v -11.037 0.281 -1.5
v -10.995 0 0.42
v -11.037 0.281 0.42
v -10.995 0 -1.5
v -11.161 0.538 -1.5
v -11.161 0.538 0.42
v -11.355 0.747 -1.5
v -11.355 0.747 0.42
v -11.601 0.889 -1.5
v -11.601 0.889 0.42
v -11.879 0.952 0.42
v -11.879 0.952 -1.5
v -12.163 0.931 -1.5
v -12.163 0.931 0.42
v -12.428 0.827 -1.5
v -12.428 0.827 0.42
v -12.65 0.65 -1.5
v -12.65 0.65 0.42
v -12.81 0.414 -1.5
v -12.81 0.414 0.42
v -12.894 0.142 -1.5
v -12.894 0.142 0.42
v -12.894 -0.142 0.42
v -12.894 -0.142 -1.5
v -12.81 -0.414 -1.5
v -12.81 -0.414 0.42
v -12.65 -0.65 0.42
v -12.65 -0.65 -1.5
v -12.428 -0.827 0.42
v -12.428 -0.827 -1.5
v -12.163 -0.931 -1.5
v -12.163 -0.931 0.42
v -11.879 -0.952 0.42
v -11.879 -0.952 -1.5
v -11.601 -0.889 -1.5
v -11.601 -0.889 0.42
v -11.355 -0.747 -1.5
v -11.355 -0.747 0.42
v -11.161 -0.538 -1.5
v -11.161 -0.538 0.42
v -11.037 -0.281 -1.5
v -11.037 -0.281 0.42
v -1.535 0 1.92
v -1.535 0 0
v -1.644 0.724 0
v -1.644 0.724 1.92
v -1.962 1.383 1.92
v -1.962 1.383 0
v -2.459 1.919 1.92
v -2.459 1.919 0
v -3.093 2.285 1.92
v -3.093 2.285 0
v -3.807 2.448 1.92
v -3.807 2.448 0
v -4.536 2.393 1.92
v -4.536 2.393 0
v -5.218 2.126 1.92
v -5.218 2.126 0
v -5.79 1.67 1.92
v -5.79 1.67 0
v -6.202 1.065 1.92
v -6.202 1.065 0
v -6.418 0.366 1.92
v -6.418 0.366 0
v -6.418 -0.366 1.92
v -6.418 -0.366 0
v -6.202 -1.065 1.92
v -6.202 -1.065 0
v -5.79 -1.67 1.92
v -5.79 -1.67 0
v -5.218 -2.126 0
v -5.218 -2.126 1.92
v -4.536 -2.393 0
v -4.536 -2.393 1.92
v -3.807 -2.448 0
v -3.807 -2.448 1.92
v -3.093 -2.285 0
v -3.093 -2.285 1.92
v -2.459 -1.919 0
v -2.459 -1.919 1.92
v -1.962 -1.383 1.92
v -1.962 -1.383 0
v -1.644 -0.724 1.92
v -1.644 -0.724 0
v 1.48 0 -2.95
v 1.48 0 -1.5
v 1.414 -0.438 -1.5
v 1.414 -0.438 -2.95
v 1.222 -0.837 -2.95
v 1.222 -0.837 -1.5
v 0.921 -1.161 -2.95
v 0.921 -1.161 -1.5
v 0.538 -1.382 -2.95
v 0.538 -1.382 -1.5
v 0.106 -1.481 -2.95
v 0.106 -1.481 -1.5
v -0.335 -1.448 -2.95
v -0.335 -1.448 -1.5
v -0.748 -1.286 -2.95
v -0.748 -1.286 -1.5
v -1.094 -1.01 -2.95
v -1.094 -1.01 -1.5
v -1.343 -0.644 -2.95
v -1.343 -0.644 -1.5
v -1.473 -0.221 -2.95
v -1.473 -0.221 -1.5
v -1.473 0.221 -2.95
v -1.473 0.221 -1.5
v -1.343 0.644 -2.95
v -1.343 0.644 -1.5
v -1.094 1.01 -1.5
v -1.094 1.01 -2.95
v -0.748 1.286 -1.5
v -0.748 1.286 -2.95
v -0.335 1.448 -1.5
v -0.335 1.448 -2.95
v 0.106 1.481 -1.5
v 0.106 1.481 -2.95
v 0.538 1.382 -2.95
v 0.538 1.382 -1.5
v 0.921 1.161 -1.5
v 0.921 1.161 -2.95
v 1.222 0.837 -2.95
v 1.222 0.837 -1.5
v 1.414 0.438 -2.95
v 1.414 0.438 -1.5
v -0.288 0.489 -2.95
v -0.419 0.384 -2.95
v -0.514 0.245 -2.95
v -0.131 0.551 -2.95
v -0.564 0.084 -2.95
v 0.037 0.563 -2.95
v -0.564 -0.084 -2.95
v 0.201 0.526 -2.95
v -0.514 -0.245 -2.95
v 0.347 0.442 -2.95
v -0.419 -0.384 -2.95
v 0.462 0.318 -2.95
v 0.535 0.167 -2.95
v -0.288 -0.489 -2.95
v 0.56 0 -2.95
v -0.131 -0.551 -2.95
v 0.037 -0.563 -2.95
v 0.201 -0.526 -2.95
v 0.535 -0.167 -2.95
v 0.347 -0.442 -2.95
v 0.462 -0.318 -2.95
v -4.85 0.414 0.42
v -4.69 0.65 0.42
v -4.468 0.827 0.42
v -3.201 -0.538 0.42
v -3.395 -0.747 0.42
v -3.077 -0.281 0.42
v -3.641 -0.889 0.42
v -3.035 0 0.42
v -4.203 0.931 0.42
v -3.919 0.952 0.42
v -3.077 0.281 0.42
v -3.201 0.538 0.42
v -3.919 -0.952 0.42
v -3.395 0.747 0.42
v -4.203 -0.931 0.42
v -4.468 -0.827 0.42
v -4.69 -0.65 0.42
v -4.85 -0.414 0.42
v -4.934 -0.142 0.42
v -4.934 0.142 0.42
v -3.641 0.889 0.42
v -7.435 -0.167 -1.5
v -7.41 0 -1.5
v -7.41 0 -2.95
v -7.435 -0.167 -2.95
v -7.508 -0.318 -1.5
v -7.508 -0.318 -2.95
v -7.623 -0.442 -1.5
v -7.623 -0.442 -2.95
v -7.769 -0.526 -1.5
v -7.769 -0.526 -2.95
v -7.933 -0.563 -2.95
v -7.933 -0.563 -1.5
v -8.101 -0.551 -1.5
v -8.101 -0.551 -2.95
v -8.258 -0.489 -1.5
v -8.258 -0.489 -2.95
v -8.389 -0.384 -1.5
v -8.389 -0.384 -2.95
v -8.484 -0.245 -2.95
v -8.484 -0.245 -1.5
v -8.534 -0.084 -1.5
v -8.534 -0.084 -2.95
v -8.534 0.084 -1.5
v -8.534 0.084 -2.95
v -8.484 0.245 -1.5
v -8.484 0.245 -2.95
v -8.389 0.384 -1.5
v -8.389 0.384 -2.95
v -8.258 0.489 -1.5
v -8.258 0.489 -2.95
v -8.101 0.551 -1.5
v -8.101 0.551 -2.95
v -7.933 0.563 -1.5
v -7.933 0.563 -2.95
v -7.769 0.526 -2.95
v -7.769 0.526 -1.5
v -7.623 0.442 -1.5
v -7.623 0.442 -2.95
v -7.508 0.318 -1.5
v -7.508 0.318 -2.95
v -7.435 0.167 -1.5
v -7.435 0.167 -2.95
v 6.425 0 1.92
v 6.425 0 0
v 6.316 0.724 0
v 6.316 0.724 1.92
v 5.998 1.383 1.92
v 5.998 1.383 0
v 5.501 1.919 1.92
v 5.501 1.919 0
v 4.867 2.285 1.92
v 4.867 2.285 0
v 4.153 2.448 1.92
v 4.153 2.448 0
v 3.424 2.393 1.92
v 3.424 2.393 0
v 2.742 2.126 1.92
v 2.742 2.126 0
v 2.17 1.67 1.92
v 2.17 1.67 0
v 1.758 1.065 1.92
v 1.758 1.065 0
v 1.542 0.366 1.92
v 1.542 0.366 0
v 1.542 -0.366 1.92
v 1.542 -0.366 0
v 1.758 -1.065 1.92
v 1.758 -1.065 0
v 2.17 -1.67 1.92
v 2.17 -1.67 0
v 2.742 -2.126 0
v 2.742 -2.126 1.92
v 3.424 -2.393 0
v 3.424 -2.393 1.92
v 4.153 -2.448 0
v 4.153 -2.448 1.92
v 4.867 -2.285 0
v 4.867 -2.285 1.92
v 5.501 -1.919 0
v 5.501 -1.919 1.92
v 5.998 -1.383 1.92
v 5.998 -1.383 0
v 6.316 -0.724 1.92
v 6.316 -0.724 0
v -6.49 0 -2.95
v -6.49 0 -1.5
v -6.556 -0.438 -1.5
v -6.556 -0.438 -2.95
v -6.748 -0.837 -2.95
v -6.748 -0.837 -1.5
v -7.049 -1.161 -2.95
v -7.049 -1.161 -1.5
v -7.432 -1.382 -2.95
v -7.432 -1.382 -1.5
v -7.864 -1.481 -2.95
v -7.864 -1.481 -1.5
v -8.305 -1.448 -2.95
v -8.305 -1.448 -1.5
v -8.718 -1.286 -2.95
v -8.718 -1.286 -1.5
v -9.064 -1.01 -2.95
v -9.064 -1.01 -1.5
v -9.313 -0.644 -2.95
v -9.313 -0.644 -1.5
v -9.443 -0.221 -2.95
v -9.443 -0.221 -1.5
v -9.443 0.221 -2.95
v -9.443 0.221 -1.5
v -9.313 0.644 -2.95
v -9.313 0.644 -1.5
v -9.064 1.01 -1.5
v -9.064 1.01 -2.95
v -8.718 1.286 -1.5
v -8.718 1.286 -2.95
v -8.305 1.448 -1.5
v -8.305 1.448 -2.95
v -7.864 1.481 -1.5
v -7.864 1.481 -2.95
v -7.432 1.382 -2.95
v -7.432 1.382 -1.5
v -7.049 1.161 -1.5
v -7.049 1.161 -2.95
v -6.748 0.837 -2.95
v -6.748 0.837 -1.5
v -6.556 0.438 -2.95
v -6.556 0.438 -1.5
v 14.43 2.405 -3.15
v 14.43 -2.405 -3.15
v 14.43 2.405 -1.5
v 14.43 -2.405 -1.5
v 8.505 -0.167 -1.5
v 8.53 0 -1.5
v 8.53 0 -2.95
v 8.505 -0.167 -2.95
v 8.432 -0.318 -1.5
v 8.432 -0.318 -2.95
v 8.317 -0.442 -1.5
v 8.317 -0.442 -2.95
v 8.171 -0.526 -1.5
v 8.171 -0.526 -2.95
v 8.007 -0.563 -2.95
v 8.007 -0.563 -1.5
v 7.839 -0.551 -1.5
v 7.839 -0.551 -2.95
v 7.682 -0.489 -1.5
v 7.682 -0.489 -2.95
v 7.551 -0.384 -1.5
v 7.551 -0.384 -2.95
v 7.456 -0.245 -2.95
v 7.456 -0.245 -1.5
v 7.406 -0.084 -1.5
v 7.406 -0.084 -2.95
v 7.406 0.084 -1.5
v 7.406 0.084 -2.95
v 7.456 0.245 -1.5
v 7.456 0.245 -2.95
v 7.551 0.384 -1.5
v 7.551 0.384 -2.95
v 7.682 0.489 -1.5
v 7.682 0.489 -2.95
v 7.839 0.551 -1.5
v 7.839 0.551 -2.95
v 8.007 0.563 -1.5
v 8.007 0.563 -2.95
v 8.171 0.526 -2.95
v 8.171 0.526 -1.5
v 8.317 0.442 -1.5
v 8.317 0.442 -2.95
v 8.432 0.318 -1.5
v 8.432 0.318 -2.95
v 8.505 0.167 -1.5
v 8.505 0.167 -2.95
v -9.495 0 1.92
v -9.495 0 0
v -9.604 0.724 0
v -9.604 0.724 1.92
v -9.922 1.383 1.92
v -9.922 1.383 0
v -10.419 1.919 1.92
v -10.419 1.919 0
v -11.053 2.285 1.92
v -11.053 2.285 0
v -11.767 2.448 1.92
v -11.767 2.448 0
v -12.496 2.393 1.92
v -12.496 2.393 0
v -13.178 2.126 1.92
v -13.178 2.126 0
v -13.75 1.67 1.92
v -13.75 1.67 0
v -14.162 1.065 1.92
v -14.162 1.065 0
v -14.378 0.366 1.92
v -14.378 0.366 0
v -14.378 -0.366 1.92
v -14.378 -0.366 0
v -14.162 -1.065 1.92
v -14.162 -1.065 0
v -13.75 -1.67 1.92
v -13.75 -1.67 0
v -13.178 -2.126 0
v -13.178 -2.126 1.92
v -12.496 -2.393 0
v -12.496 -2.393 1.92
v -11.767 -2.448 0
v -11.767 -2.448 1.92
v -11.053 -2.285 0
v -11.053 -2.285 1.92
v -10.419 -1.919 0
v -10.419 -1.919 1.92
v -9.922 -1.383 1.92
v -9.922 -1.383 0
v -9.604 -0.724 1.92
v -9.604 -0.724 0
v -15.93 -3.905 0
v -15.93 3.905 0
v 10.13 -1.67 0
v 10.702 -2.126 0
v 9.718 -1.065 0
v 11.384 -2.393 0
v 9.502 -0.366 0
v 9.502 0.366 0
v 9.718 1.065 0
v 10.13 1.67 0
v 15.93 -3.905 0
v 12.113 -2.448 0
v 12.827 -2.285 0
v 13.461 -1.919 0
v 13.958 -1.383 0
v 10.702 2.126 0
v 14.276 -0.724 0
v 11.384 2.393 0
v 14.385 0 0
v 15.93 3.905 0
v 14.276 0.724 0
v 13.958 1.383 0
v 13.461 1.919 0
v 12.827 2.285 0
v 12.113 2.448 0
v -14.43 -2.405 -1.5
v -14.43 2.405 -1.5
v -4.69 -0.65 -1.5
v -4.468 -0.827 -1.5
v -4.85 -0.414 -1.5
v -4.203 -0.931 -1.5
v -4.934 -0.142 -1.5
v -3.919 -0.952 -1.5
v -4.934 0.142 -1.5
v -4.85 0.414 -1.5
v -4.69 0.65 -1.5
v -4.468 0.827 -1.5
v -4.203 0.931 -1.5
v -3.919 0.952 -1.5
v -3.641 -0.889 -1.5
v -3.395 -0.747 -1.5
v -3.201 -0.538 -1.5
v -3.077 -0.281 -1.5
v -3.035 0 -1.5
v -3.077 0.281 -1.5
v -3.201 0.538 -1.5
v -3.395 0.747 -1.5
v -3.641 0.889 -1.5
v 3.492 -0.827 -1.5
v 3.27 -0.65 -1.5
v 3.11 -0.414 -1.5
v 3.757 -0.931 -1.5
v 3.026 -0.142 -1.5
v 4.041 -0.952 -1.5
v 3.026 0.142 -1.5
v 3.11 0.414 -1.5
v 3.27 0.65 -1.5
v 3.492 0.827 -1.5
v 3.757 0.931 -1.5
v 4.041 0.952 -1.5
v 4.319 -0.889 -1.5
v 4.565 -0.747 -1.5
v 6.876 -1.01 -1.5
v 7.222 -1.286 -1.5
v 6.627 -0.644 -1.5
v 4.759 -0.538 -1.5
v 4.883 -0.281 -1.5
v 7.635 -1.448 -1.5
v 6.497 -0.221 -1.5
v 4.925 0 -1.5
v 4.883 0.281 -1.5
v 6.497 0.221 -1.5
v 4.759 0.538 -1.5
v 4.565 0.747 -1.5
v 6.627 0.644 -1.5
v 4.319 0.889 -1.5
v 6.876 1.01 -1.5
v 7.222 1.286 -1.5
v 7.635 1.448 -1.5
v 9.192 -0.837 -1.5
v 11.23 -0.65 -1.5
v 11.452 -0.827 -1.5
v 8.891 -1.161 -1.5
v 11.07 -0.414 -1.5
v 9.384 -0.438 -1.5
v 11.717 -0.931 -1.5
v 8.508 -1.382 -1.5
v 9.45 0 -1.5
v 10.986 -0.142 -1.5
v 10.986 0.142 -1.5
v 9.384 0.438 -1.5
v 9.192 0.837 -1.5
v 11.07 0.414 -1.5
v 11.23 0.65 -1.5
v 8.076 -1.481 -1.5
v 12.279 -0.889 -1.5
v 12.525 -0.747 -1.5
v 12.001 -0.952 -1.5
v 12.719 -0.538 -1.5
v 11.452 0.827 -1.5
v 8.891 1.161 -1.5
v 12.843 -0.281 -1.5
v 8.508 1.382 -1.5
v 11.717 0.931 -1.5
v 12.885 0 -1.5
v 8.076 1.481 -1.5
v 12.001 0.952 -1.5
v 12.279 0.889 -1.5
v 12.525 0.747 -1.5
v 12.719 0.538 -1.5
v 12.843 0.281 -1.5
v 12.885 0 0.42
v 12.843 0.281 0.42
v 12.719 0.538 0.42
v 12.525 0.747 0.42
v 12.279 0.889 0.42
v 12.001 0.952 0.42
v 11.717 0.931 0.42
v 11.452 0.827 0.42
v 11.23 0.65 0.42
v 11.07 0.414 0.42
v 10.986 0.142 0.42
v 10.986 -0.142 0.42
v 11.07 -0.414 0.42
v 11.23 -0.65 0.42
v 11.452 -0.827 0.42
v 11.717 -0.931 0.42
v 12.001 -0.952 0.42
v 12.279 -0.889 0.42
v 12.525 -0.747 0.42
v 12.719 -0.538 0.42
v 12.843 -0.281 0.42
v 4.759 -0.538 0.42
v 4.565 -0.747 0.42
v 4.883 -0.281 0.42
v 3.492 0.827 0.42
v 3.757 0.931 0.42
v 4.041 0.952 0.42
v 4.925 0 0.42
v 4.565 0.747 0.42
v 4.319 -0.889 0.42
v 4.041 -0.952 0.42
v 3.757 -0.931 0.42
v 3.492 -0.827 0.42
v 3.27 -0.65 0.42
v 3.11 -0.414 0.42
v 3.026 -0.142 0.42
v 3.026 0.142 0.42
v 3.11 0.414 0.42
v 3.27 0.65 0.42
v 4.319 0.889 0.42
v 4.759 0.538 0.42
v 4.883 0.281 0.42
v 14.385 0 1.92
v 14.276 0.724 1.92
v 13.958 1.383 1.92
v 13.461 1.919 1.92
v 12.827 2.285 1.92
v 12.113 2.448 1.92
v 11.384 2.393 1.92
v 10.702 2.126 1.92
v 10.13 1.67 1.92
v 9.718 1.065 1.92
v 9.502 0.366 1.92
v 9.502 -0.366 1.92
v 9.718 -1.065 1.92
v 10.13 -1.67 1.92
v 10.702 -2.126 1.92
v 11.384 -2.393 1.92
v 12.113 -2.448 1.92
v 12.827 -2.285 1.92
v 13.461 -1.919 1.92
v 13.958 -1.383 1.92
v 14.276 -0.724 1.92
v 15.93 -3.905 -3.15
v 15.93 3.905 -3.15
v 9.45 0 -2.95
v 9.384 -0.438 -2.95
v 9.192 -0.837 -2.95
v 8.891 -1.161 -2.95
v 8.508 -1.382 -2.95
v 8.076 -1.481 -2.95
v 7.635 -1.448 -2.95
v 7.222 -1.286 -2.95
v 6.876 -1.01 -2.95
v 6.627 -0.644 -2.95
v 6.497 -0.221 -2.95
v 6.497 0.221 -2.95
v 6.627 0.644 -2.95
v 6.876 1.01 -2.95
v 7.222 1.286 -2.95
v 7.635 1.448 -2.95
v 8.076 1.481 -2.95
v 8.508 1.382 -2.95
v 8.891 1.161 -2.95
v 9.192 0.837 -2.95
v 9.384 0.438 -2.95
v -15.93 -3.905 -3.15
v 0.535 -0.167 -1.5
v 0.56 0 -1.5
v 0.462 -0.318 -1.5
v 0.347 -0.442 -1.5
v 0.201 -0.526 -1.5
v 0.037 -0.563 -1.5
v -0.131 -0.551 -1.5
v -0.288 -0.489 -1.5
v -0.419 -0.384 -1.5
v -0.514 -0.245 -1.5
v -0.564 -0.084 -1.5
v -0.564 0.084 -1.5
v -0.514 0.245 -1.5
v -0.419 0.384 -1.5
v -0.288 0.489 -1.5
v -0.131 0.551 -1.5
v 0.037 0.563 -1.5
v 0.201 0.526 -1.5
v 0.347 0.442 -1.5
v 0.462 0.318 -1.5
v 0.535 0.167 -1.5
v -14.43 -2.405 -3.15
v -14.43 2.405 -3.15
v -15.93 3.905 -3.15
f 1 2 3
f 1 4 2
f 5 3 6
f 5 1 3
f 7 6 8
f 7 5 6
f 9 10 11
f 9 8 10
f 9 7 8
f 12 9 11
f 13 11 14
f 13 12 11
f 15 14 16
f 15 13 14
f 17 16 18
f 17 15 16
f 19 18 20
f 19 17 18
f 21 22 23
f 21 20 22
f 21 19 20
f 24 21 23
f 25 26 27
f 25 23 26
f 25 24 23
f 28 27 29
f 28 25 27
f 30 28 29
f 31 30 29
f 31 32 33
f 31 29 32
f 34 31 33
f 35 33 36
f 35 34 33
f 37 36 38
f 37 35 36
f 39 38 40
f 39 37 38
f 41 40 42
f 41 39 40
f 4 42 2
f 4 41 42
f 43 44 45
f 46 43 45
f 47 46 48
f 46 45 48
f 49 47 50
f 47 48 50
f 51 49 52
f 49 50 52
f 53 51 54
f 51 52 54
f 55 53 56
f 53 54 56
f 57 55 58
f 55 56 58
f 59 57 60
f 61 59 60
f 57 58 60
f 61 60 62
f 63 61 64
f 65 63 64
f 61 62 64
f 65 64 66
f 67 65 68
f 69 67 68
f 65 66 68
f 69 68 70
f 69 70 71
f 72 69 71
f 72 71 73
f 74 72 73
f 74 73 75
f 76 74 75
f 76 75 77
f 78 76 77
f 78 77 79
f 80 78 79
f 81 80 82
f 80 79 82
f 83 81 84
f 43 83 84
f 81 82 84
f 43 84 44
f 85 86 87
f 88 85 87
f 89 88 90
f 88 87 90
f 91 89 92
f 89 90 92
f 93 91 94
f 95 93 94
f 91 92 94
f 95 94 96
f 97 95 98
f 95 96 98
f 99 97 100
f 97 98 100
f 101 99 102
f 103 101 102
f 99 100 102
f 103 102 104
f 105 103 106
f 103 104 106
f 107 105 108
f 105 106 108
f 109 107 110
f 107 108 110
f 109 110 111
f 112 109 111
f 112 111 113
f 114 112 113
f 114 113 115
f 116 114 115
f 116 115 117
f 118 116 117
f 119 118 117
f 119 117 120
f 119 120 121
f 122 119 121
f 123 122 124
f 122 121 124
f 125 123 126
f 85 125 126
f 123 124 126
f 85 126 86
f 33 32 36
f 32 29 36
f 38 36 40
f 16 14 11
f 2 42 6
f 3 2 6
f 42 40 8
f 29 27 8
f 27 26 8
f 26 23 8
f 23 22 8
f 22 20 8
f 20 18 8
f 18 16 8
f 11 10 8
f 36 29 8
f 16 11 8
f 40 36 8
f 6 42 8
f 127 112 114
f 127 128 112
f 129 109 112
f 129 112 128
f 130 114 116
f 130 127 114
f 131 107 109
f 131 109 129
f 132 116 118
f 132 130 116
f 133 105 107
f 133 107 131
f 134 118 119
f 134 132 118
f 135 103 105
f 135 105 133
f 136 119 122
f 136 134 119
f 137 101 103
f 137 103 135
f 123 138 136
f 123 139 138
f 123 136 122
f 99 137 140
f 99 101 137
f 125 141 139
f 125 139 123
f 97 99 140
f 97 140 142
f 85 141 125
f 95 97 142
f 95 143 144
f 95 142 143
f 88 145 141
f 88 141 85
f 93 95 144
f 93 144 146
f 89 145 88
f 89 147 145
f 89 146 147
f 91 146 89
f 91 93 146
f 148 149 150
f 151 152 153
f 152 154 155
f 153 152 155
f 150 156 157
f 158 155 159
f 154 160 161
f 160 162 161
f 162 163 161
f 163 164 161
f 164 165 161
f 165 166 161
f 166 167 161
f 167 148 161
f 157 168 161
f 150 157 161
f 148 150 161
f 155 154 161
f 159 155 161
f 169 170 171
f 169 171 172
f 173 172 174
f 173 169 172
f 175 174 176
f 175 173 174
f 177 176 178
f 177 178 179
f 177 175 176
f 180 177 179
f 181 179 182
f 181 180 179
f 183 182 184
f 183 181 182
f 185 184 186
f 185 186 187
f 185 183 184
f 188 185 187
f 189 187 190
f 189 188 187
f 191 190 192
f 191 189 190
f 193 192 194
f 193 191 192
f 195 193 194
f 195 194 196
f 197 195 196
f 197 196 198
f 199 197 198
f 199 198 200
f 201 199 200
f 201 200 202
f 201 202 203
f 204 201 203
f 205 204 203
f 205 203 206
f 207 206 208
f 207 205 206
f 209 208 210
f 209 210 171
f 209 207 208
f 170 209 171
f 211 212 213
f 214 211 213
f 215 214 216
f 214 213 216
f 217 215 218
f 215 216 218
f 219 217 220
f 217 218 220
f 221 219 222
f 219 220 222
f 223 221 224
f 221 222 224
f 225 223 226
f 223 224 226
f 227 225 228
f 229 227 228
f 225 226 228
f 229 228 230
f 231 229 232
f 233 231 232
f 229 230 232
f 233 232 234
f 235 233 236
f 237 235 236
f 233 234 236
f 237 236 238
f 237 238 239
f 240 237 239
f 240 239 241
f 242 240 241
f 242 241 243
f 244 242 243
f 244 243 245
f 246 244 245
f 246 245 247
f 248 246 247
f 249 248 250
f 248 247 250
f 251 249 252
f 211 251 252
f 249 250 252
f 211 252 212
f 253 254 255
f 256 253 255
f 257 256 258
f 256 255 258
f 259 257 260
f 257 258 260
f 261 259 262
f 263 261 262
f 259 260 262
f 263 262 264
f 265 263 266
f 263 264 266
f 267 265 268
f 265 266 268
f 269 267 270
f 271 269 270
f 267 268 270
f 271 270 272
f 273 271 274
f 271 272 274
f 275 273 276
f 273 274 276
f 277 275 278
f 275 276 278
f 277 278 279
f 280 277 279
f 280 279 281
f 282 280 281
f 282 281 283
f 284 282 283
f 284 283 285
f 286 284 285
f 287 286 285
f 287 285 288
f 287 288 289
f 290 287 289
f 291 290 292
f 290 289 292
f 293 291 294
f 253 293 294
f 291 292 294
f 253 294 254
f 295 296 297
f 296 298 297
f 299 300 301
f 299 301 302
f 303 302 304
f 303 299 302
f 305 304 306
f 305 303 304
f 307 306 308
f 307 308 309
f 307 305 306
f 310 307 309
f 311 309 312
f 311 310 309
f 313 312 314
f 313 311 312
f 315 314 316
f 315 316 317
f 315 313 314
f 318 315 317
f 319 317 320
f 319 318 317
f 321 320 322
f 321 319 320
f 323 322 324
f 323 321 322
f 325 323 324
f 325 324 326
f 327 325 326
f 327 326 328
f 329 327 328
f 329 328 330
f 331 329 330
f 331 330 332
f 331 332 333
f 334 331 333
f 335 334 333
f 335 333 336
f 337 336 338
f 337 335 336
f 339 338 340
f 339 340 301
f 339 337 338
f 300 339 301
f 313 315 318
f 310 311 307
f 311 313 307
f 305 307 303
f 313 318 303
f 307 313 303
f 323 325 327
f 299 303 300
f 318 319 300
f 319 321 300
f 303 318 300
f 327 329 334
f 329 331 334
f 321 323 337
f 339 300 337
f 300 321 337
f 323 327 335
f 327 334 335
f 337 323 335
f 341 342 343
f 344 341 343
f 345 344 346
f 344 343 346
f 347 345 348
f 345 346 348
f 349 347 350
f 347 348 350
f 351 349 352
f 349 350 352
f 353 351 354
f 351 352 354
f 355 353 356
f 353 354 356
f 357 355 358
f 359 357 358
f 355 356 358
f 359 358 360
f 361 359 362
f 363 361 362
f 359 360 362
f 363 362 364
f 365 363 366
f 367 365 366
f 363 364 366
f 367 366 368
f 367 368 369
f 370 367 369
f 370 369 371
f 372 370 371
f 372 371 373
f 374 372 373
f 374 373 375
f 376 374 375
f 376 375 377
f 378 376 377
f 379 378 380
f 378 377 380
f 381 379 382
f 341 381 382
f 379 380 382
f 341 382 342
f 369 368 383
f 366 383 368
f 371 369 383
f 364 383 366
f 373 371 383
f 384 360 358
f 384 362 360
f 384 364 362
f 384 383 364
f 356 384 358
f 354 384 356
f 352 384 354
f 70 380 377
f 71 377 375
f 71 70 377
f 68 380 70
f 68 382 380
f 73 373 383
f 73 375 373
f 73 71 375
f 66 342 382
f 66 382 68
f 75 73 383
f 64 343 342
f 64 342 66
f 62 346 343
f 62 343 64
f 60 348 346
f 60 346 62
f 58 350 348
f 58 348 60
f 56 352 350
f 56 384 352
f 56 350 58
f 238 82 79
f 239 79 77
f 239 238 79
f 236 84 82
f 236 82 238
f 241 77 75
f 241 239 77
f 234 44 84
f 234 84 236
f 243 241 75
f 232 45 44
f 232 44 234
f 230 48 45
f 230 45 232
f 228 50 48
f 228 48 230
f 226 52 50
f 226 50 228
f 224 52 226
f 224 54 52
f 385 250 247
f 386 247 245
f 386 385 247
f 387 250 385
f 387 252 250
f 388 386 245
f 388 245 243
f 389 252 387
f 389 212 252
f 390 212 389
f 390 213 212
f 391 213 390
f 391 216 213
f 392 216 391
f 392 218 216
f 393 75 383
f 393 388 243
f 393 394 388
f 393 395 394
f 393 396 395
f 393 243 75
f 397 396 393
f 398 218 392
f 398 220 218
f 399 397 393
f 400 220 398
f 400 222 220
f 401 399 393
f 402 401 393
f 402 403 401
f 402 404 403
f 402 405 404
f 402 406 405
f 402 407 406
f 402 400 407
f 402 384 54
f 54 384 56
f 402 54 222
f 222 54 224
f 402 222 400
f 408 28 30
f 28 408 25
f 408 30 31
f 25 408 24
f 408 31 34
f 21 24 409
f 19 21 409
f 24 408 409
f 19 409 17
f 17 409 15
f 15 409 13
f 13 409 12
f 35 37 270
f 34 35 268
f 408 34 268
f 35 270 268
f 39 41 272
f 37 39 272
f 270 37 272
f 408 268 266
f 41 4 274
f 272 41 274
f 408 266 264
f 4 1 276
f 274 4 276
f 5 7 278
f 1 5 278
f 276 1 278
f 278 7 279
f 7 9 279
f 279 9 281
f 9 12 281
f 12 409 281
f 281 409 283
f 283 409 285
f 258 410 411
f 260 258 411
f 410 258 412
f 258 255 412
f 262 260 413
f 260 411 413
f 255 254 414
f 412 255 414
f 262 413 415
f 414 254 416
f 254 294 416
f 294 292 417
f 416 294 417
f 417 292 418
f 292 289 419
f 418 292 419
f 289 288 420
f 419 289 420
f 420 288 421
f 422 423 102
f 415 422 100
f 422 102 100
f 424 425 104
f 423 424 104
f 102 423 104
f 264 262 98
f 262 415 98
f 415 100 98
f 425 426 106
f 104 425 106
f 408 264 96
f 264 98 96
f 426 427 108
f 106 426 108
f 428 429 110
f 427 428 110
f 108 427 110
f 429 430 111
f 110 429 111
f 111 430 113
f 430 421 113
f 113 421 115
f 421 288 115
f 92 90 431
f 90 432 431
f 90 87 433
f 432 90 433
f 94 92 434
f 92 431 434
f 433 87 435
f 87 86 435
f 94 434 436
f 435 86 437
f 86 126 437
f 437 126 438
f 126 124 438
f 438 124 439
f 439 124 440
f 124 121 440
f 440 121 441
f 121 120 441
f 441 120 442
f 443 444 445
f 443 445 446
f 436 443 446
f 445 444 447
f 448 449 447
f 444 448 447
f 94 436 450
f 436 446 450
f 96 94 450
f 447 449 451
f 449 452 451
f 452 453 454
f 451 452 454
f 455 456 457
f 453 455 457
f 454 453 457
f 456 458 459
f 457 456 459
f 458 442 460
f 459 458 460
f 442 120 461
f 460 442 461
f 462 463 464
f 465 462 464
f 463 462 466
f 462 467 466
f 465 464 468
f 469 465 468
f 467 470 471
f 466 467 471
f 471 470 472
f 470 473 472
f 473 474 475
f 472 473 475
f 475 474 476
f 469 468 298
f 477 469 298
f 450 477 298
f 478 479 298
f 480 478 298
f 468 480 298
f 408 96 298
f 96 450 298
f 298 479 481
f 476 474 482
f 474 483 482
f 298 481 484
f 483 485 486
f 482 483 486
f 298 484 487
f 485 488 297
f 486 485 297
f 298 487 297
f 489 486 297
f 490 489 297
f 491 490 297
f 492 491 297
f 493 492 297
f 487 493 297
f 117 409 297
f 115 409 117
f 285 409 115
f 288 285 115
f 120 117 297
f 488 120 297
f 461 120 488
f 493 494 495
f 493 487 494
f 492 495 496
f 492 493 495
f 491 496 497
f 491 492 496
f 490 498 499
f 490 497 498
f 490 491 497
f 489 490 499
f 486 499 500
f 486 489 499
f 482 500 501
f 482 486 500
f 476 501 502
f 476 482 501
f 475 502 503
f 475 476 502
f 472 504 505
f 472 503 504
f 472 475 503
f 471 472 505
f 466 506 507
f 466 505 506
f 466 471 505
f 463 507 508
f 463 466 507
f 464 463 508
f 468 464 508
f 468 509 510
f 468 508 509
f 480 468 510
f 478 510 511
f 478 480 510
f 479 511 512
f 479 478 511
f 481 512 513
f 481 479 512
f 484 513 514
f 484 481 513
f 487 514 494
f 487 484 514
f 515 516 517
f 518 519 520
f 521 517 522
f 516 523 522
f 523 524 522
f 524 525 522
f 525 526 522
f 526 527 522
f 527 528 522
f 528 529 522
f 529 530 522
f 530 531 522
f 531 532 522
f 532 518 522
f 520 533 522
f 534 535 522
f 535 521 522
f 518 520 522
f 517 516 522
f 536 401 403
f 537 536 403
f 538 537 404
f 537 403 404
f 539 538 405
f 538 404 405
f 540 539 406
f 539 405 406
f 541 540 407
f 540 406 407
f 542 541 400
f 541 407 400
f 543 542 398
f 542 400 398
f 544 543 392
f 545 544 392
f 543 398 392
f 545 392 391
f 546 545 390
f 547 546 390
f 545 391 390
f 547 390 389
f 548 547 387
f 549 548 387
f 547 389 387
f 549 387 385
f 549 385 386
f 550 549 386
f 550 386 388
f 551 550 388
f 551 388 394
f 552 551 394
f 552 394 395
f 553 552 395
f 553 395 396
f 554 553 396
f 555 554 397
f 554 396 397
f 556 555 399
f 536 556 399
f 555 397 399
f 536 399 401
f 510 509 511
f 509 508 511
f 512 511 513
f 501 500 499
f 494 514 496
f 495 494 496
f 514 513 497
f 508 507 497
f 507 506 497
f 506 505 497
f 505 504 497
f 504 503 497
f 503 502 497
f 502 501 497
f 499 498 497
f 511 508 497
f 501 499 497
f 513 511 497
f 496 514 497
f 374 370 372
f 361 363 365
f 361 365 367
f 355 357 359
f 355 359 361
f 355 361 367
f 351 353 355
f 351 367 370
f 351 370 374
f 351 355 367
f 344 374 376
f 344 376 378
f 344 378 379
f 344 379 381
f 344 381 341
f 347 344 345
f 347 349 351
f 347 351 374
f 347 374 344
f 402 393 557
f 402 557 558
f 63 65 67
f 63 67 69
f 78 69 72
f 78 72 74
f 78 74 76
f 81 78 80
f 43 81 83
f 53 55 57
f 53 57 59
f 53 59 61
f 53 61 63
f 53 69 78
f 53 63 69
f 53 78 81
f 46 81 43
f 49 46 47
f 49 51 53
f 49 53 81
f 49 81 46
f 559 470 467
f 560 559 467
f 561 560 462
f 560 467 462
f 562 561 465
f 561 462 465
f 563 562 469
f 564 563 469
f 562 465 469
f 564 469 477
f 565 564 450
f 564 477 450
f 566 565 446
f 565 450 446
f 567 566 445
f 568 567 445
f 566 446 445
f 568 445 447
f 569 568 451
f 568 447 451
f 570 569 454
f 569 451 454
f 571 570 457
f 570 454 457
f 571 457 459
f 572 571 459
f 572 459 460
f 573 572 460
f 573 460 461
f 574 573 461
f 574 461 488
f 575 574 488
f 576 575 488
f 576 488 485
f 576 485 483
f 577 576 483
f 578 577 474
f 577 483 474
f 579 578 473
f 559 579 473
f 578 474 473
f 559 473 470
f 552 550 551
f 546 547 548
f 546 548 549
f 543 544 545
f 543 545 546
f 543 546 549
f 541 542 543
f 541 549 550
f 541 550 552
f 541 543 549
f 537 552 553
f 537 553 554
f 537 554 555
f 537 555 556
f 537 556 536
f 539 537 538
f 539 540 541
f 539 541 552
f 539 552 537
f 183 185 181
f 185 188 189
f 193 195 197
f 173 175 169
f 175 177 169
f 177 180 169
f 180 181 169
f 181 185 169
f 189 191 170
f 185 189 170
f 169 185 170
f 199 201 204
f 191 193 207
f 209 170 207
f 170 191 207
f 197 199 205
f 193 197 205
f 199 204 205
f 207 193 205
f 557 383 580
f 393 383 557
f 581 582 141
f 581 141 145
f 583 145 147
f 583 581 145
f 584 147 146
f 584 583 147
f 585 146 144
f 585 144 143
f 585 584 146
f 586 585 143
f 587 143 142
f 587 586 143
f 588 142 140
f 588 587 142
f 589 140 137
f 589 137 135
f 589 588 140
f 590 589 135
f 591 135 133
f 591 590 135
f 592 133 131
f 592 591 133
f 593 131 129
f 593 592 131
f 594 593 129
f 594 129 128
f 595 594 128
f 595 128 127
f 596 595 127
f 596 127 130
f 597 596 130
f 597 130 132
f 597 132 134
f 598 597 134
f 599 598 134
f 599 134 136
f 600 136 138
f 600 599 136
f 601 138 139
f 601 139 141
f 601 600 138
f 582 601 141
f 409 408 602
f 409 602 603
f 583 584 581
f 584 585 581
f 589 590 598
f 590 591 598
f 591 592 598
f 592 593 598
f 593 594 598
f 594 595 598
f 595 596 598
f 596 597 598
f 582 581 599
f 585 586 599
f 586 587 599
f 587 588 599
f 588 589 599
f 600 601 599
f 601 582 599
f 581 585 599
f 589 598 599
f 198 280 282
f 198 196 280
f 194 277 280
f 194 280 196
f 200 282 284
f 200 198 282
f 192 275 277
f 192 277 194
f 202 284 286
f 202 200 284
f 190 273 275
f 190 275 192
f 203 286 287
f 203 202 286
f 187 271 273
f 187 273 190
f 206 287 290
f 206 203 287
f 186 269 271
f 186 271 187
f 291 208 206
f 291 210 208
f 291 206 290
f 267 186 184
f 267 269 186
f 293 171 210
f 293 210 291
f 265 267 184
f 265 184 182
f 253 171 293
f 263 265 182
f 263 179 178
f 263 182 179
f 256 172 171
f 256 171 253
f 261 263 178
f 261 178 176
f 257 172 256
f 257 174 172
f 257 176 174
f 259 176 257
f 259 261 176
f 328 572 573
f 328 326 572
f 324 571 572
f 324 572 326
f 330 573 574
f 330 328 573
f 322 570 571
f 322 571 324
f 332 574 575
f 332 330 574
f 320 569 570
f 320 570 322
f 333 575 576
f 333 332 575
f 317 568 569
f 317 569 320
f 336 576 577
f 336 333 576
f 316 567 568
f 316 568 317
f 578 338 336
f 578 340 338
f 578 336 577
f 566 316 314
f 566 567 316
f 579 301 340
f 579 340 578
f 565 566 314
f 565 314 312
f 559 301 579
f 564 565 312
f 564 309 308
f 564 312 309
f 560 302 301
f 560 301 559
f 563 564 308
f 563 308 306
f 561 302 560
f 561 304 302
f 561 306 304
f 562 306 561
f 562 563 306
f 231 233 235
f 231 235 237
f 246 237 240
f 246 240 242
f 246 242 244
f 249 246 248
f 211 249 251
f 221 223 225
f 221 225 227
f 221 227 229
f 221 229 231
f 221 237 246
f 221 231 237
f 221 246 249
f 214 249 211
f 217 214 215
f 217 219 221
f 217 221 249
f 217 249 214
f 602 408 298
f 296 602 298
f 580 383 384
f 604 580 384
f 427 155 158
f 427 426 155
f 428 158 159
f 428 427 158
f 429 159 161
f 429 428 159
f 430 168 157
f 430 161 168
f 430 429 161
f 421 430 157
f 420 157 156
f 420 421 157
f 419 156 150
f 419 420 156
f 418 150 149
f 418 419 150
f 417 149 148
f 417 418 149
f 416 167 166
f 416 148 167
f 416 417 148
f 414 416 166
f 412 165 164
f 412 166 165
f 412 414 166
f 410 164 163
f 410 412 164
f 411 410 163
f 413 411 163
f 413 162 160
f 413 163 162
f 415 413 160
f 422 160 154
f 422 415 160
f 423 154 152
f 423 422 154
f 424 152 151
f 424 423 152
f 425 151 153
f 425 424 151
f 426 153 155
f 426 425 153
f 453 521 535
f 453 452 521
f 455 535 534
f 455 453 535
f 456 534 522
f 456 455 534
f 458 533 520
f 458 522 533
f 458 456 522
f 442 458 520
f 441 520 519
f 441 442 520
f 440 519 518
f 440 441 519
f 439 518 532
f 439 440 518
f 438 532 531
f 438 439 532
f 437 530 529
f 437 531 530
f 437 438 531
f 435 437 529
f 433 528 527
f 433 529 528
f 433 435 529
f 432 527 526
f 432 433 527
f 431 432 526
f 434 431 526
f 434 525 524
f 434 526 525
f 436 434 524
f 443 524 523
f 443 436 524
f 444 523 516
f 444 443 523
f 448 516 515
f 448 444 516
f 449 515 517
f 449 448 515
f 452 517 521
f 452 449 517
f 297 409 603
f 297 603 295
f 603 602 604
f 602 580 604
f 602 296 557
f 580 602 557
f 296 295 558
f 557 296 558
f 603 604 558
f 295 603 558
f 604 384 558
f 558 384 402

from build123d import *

# Parameters (mm, degrees)
SKETCH1_W           = 31.86
SKETCH1_H           = 7.81
BOSS_EXTRUDE1_DEPTH = 3.15
SKETCH2_R           = 2.455
BOSS_EXTRUDE2_DEPTH = 1.92
SHELL1_T            = -1.5
SKETCH3_R           = 1.485
SKETCH3_R_2         = 0.565
BOSS_EXTRUDE3_DEPTH = 1.45


with BuildPart() as part:
    # Sketch1 → Boss-Extrude1 (new body)
    with BuildSketch(Plane.XY):
        Rectangle(SKETCH1_W, SKETCH1_H)
    extrude(amount=-BOSS_EXTRUDE1_DEPTH)

    # Sketch2 → Boss-Extrude2 (add)
    with BuildSketch(Plane.XY):
        with Locations((-11.95, 0)):
            Circle(SKETCH2_R)
        with Locations((-3.99, 0)):
            Circle(SKETCH2_R)
        with Locations((3.97, 0)):
            Circle(SKETCH2_R)
        with Locations((11.93, 0)):
            Circle(SKETCH2_R)
    extrude(amount=BOSS_EXTRUDE2_DEPTH)

    # Shell1
    shell1_openings = [part.faces().sort_by_distance(p)[0] for p in [
        (0, 0, -3.15),
    ]]
    offset(amount=SHELL1_T, openings=shell1_openings, kind=Kind.INTERSECTION)

    # Sketch3 → Boss-Extrude3 (add)
    # profile 1 of 3: a face of its own
    with BuildSketch(Plane(origin=(0, 0, -1.5), x_dir=(-1, 0, 0), z_dir=(0, 0, -1))):
        with Locations(Location((-7.965, 0, 0), (0, 0, 180))):
            Circle(SKETCH3_R)
        with Locations(Location((-7.965, 0, 0), (0, 0, 180))):
            Circle(SKETCH3_R_2, mode=Mode.SUBTRACT)
    # profile 2 of 3: a face of its own
    with BuildSketch(Plane(origin=(0, 0, -1.5), x_dir=(-1, 0, 0), z_dir=(0, 0, -1))):
        with Locations(Location((0.005, 0, 0), (0, 0, 180))):
            Circle(SKETCH3_R)
        with Locations(Location((0.005, 0, 0), (0, 0, 180))):
            Circle(SKETCH3_R_2, mode=Mode.SUBTRACT)
    # profile 3 of 3: a face of its own
    with BuildSketch(Plane(origin=(0, 0, -1.5), x_dir=(-1, 0, 0), z_dir=(0, 0, -1))):
        with Locations(Location((7.975, 0, 0), (0, 0, 180))):
            Circle(SKETCH3_R)
        with Locations(Location((7.975, 0, 0), (0, 0, 180))):
            Circle(SKETCH3_R_2, mode=Mode.SUBTRACT)
    extrude(amount=BOSS_EXTRUDE3_DEPTH)


solid = part.part
